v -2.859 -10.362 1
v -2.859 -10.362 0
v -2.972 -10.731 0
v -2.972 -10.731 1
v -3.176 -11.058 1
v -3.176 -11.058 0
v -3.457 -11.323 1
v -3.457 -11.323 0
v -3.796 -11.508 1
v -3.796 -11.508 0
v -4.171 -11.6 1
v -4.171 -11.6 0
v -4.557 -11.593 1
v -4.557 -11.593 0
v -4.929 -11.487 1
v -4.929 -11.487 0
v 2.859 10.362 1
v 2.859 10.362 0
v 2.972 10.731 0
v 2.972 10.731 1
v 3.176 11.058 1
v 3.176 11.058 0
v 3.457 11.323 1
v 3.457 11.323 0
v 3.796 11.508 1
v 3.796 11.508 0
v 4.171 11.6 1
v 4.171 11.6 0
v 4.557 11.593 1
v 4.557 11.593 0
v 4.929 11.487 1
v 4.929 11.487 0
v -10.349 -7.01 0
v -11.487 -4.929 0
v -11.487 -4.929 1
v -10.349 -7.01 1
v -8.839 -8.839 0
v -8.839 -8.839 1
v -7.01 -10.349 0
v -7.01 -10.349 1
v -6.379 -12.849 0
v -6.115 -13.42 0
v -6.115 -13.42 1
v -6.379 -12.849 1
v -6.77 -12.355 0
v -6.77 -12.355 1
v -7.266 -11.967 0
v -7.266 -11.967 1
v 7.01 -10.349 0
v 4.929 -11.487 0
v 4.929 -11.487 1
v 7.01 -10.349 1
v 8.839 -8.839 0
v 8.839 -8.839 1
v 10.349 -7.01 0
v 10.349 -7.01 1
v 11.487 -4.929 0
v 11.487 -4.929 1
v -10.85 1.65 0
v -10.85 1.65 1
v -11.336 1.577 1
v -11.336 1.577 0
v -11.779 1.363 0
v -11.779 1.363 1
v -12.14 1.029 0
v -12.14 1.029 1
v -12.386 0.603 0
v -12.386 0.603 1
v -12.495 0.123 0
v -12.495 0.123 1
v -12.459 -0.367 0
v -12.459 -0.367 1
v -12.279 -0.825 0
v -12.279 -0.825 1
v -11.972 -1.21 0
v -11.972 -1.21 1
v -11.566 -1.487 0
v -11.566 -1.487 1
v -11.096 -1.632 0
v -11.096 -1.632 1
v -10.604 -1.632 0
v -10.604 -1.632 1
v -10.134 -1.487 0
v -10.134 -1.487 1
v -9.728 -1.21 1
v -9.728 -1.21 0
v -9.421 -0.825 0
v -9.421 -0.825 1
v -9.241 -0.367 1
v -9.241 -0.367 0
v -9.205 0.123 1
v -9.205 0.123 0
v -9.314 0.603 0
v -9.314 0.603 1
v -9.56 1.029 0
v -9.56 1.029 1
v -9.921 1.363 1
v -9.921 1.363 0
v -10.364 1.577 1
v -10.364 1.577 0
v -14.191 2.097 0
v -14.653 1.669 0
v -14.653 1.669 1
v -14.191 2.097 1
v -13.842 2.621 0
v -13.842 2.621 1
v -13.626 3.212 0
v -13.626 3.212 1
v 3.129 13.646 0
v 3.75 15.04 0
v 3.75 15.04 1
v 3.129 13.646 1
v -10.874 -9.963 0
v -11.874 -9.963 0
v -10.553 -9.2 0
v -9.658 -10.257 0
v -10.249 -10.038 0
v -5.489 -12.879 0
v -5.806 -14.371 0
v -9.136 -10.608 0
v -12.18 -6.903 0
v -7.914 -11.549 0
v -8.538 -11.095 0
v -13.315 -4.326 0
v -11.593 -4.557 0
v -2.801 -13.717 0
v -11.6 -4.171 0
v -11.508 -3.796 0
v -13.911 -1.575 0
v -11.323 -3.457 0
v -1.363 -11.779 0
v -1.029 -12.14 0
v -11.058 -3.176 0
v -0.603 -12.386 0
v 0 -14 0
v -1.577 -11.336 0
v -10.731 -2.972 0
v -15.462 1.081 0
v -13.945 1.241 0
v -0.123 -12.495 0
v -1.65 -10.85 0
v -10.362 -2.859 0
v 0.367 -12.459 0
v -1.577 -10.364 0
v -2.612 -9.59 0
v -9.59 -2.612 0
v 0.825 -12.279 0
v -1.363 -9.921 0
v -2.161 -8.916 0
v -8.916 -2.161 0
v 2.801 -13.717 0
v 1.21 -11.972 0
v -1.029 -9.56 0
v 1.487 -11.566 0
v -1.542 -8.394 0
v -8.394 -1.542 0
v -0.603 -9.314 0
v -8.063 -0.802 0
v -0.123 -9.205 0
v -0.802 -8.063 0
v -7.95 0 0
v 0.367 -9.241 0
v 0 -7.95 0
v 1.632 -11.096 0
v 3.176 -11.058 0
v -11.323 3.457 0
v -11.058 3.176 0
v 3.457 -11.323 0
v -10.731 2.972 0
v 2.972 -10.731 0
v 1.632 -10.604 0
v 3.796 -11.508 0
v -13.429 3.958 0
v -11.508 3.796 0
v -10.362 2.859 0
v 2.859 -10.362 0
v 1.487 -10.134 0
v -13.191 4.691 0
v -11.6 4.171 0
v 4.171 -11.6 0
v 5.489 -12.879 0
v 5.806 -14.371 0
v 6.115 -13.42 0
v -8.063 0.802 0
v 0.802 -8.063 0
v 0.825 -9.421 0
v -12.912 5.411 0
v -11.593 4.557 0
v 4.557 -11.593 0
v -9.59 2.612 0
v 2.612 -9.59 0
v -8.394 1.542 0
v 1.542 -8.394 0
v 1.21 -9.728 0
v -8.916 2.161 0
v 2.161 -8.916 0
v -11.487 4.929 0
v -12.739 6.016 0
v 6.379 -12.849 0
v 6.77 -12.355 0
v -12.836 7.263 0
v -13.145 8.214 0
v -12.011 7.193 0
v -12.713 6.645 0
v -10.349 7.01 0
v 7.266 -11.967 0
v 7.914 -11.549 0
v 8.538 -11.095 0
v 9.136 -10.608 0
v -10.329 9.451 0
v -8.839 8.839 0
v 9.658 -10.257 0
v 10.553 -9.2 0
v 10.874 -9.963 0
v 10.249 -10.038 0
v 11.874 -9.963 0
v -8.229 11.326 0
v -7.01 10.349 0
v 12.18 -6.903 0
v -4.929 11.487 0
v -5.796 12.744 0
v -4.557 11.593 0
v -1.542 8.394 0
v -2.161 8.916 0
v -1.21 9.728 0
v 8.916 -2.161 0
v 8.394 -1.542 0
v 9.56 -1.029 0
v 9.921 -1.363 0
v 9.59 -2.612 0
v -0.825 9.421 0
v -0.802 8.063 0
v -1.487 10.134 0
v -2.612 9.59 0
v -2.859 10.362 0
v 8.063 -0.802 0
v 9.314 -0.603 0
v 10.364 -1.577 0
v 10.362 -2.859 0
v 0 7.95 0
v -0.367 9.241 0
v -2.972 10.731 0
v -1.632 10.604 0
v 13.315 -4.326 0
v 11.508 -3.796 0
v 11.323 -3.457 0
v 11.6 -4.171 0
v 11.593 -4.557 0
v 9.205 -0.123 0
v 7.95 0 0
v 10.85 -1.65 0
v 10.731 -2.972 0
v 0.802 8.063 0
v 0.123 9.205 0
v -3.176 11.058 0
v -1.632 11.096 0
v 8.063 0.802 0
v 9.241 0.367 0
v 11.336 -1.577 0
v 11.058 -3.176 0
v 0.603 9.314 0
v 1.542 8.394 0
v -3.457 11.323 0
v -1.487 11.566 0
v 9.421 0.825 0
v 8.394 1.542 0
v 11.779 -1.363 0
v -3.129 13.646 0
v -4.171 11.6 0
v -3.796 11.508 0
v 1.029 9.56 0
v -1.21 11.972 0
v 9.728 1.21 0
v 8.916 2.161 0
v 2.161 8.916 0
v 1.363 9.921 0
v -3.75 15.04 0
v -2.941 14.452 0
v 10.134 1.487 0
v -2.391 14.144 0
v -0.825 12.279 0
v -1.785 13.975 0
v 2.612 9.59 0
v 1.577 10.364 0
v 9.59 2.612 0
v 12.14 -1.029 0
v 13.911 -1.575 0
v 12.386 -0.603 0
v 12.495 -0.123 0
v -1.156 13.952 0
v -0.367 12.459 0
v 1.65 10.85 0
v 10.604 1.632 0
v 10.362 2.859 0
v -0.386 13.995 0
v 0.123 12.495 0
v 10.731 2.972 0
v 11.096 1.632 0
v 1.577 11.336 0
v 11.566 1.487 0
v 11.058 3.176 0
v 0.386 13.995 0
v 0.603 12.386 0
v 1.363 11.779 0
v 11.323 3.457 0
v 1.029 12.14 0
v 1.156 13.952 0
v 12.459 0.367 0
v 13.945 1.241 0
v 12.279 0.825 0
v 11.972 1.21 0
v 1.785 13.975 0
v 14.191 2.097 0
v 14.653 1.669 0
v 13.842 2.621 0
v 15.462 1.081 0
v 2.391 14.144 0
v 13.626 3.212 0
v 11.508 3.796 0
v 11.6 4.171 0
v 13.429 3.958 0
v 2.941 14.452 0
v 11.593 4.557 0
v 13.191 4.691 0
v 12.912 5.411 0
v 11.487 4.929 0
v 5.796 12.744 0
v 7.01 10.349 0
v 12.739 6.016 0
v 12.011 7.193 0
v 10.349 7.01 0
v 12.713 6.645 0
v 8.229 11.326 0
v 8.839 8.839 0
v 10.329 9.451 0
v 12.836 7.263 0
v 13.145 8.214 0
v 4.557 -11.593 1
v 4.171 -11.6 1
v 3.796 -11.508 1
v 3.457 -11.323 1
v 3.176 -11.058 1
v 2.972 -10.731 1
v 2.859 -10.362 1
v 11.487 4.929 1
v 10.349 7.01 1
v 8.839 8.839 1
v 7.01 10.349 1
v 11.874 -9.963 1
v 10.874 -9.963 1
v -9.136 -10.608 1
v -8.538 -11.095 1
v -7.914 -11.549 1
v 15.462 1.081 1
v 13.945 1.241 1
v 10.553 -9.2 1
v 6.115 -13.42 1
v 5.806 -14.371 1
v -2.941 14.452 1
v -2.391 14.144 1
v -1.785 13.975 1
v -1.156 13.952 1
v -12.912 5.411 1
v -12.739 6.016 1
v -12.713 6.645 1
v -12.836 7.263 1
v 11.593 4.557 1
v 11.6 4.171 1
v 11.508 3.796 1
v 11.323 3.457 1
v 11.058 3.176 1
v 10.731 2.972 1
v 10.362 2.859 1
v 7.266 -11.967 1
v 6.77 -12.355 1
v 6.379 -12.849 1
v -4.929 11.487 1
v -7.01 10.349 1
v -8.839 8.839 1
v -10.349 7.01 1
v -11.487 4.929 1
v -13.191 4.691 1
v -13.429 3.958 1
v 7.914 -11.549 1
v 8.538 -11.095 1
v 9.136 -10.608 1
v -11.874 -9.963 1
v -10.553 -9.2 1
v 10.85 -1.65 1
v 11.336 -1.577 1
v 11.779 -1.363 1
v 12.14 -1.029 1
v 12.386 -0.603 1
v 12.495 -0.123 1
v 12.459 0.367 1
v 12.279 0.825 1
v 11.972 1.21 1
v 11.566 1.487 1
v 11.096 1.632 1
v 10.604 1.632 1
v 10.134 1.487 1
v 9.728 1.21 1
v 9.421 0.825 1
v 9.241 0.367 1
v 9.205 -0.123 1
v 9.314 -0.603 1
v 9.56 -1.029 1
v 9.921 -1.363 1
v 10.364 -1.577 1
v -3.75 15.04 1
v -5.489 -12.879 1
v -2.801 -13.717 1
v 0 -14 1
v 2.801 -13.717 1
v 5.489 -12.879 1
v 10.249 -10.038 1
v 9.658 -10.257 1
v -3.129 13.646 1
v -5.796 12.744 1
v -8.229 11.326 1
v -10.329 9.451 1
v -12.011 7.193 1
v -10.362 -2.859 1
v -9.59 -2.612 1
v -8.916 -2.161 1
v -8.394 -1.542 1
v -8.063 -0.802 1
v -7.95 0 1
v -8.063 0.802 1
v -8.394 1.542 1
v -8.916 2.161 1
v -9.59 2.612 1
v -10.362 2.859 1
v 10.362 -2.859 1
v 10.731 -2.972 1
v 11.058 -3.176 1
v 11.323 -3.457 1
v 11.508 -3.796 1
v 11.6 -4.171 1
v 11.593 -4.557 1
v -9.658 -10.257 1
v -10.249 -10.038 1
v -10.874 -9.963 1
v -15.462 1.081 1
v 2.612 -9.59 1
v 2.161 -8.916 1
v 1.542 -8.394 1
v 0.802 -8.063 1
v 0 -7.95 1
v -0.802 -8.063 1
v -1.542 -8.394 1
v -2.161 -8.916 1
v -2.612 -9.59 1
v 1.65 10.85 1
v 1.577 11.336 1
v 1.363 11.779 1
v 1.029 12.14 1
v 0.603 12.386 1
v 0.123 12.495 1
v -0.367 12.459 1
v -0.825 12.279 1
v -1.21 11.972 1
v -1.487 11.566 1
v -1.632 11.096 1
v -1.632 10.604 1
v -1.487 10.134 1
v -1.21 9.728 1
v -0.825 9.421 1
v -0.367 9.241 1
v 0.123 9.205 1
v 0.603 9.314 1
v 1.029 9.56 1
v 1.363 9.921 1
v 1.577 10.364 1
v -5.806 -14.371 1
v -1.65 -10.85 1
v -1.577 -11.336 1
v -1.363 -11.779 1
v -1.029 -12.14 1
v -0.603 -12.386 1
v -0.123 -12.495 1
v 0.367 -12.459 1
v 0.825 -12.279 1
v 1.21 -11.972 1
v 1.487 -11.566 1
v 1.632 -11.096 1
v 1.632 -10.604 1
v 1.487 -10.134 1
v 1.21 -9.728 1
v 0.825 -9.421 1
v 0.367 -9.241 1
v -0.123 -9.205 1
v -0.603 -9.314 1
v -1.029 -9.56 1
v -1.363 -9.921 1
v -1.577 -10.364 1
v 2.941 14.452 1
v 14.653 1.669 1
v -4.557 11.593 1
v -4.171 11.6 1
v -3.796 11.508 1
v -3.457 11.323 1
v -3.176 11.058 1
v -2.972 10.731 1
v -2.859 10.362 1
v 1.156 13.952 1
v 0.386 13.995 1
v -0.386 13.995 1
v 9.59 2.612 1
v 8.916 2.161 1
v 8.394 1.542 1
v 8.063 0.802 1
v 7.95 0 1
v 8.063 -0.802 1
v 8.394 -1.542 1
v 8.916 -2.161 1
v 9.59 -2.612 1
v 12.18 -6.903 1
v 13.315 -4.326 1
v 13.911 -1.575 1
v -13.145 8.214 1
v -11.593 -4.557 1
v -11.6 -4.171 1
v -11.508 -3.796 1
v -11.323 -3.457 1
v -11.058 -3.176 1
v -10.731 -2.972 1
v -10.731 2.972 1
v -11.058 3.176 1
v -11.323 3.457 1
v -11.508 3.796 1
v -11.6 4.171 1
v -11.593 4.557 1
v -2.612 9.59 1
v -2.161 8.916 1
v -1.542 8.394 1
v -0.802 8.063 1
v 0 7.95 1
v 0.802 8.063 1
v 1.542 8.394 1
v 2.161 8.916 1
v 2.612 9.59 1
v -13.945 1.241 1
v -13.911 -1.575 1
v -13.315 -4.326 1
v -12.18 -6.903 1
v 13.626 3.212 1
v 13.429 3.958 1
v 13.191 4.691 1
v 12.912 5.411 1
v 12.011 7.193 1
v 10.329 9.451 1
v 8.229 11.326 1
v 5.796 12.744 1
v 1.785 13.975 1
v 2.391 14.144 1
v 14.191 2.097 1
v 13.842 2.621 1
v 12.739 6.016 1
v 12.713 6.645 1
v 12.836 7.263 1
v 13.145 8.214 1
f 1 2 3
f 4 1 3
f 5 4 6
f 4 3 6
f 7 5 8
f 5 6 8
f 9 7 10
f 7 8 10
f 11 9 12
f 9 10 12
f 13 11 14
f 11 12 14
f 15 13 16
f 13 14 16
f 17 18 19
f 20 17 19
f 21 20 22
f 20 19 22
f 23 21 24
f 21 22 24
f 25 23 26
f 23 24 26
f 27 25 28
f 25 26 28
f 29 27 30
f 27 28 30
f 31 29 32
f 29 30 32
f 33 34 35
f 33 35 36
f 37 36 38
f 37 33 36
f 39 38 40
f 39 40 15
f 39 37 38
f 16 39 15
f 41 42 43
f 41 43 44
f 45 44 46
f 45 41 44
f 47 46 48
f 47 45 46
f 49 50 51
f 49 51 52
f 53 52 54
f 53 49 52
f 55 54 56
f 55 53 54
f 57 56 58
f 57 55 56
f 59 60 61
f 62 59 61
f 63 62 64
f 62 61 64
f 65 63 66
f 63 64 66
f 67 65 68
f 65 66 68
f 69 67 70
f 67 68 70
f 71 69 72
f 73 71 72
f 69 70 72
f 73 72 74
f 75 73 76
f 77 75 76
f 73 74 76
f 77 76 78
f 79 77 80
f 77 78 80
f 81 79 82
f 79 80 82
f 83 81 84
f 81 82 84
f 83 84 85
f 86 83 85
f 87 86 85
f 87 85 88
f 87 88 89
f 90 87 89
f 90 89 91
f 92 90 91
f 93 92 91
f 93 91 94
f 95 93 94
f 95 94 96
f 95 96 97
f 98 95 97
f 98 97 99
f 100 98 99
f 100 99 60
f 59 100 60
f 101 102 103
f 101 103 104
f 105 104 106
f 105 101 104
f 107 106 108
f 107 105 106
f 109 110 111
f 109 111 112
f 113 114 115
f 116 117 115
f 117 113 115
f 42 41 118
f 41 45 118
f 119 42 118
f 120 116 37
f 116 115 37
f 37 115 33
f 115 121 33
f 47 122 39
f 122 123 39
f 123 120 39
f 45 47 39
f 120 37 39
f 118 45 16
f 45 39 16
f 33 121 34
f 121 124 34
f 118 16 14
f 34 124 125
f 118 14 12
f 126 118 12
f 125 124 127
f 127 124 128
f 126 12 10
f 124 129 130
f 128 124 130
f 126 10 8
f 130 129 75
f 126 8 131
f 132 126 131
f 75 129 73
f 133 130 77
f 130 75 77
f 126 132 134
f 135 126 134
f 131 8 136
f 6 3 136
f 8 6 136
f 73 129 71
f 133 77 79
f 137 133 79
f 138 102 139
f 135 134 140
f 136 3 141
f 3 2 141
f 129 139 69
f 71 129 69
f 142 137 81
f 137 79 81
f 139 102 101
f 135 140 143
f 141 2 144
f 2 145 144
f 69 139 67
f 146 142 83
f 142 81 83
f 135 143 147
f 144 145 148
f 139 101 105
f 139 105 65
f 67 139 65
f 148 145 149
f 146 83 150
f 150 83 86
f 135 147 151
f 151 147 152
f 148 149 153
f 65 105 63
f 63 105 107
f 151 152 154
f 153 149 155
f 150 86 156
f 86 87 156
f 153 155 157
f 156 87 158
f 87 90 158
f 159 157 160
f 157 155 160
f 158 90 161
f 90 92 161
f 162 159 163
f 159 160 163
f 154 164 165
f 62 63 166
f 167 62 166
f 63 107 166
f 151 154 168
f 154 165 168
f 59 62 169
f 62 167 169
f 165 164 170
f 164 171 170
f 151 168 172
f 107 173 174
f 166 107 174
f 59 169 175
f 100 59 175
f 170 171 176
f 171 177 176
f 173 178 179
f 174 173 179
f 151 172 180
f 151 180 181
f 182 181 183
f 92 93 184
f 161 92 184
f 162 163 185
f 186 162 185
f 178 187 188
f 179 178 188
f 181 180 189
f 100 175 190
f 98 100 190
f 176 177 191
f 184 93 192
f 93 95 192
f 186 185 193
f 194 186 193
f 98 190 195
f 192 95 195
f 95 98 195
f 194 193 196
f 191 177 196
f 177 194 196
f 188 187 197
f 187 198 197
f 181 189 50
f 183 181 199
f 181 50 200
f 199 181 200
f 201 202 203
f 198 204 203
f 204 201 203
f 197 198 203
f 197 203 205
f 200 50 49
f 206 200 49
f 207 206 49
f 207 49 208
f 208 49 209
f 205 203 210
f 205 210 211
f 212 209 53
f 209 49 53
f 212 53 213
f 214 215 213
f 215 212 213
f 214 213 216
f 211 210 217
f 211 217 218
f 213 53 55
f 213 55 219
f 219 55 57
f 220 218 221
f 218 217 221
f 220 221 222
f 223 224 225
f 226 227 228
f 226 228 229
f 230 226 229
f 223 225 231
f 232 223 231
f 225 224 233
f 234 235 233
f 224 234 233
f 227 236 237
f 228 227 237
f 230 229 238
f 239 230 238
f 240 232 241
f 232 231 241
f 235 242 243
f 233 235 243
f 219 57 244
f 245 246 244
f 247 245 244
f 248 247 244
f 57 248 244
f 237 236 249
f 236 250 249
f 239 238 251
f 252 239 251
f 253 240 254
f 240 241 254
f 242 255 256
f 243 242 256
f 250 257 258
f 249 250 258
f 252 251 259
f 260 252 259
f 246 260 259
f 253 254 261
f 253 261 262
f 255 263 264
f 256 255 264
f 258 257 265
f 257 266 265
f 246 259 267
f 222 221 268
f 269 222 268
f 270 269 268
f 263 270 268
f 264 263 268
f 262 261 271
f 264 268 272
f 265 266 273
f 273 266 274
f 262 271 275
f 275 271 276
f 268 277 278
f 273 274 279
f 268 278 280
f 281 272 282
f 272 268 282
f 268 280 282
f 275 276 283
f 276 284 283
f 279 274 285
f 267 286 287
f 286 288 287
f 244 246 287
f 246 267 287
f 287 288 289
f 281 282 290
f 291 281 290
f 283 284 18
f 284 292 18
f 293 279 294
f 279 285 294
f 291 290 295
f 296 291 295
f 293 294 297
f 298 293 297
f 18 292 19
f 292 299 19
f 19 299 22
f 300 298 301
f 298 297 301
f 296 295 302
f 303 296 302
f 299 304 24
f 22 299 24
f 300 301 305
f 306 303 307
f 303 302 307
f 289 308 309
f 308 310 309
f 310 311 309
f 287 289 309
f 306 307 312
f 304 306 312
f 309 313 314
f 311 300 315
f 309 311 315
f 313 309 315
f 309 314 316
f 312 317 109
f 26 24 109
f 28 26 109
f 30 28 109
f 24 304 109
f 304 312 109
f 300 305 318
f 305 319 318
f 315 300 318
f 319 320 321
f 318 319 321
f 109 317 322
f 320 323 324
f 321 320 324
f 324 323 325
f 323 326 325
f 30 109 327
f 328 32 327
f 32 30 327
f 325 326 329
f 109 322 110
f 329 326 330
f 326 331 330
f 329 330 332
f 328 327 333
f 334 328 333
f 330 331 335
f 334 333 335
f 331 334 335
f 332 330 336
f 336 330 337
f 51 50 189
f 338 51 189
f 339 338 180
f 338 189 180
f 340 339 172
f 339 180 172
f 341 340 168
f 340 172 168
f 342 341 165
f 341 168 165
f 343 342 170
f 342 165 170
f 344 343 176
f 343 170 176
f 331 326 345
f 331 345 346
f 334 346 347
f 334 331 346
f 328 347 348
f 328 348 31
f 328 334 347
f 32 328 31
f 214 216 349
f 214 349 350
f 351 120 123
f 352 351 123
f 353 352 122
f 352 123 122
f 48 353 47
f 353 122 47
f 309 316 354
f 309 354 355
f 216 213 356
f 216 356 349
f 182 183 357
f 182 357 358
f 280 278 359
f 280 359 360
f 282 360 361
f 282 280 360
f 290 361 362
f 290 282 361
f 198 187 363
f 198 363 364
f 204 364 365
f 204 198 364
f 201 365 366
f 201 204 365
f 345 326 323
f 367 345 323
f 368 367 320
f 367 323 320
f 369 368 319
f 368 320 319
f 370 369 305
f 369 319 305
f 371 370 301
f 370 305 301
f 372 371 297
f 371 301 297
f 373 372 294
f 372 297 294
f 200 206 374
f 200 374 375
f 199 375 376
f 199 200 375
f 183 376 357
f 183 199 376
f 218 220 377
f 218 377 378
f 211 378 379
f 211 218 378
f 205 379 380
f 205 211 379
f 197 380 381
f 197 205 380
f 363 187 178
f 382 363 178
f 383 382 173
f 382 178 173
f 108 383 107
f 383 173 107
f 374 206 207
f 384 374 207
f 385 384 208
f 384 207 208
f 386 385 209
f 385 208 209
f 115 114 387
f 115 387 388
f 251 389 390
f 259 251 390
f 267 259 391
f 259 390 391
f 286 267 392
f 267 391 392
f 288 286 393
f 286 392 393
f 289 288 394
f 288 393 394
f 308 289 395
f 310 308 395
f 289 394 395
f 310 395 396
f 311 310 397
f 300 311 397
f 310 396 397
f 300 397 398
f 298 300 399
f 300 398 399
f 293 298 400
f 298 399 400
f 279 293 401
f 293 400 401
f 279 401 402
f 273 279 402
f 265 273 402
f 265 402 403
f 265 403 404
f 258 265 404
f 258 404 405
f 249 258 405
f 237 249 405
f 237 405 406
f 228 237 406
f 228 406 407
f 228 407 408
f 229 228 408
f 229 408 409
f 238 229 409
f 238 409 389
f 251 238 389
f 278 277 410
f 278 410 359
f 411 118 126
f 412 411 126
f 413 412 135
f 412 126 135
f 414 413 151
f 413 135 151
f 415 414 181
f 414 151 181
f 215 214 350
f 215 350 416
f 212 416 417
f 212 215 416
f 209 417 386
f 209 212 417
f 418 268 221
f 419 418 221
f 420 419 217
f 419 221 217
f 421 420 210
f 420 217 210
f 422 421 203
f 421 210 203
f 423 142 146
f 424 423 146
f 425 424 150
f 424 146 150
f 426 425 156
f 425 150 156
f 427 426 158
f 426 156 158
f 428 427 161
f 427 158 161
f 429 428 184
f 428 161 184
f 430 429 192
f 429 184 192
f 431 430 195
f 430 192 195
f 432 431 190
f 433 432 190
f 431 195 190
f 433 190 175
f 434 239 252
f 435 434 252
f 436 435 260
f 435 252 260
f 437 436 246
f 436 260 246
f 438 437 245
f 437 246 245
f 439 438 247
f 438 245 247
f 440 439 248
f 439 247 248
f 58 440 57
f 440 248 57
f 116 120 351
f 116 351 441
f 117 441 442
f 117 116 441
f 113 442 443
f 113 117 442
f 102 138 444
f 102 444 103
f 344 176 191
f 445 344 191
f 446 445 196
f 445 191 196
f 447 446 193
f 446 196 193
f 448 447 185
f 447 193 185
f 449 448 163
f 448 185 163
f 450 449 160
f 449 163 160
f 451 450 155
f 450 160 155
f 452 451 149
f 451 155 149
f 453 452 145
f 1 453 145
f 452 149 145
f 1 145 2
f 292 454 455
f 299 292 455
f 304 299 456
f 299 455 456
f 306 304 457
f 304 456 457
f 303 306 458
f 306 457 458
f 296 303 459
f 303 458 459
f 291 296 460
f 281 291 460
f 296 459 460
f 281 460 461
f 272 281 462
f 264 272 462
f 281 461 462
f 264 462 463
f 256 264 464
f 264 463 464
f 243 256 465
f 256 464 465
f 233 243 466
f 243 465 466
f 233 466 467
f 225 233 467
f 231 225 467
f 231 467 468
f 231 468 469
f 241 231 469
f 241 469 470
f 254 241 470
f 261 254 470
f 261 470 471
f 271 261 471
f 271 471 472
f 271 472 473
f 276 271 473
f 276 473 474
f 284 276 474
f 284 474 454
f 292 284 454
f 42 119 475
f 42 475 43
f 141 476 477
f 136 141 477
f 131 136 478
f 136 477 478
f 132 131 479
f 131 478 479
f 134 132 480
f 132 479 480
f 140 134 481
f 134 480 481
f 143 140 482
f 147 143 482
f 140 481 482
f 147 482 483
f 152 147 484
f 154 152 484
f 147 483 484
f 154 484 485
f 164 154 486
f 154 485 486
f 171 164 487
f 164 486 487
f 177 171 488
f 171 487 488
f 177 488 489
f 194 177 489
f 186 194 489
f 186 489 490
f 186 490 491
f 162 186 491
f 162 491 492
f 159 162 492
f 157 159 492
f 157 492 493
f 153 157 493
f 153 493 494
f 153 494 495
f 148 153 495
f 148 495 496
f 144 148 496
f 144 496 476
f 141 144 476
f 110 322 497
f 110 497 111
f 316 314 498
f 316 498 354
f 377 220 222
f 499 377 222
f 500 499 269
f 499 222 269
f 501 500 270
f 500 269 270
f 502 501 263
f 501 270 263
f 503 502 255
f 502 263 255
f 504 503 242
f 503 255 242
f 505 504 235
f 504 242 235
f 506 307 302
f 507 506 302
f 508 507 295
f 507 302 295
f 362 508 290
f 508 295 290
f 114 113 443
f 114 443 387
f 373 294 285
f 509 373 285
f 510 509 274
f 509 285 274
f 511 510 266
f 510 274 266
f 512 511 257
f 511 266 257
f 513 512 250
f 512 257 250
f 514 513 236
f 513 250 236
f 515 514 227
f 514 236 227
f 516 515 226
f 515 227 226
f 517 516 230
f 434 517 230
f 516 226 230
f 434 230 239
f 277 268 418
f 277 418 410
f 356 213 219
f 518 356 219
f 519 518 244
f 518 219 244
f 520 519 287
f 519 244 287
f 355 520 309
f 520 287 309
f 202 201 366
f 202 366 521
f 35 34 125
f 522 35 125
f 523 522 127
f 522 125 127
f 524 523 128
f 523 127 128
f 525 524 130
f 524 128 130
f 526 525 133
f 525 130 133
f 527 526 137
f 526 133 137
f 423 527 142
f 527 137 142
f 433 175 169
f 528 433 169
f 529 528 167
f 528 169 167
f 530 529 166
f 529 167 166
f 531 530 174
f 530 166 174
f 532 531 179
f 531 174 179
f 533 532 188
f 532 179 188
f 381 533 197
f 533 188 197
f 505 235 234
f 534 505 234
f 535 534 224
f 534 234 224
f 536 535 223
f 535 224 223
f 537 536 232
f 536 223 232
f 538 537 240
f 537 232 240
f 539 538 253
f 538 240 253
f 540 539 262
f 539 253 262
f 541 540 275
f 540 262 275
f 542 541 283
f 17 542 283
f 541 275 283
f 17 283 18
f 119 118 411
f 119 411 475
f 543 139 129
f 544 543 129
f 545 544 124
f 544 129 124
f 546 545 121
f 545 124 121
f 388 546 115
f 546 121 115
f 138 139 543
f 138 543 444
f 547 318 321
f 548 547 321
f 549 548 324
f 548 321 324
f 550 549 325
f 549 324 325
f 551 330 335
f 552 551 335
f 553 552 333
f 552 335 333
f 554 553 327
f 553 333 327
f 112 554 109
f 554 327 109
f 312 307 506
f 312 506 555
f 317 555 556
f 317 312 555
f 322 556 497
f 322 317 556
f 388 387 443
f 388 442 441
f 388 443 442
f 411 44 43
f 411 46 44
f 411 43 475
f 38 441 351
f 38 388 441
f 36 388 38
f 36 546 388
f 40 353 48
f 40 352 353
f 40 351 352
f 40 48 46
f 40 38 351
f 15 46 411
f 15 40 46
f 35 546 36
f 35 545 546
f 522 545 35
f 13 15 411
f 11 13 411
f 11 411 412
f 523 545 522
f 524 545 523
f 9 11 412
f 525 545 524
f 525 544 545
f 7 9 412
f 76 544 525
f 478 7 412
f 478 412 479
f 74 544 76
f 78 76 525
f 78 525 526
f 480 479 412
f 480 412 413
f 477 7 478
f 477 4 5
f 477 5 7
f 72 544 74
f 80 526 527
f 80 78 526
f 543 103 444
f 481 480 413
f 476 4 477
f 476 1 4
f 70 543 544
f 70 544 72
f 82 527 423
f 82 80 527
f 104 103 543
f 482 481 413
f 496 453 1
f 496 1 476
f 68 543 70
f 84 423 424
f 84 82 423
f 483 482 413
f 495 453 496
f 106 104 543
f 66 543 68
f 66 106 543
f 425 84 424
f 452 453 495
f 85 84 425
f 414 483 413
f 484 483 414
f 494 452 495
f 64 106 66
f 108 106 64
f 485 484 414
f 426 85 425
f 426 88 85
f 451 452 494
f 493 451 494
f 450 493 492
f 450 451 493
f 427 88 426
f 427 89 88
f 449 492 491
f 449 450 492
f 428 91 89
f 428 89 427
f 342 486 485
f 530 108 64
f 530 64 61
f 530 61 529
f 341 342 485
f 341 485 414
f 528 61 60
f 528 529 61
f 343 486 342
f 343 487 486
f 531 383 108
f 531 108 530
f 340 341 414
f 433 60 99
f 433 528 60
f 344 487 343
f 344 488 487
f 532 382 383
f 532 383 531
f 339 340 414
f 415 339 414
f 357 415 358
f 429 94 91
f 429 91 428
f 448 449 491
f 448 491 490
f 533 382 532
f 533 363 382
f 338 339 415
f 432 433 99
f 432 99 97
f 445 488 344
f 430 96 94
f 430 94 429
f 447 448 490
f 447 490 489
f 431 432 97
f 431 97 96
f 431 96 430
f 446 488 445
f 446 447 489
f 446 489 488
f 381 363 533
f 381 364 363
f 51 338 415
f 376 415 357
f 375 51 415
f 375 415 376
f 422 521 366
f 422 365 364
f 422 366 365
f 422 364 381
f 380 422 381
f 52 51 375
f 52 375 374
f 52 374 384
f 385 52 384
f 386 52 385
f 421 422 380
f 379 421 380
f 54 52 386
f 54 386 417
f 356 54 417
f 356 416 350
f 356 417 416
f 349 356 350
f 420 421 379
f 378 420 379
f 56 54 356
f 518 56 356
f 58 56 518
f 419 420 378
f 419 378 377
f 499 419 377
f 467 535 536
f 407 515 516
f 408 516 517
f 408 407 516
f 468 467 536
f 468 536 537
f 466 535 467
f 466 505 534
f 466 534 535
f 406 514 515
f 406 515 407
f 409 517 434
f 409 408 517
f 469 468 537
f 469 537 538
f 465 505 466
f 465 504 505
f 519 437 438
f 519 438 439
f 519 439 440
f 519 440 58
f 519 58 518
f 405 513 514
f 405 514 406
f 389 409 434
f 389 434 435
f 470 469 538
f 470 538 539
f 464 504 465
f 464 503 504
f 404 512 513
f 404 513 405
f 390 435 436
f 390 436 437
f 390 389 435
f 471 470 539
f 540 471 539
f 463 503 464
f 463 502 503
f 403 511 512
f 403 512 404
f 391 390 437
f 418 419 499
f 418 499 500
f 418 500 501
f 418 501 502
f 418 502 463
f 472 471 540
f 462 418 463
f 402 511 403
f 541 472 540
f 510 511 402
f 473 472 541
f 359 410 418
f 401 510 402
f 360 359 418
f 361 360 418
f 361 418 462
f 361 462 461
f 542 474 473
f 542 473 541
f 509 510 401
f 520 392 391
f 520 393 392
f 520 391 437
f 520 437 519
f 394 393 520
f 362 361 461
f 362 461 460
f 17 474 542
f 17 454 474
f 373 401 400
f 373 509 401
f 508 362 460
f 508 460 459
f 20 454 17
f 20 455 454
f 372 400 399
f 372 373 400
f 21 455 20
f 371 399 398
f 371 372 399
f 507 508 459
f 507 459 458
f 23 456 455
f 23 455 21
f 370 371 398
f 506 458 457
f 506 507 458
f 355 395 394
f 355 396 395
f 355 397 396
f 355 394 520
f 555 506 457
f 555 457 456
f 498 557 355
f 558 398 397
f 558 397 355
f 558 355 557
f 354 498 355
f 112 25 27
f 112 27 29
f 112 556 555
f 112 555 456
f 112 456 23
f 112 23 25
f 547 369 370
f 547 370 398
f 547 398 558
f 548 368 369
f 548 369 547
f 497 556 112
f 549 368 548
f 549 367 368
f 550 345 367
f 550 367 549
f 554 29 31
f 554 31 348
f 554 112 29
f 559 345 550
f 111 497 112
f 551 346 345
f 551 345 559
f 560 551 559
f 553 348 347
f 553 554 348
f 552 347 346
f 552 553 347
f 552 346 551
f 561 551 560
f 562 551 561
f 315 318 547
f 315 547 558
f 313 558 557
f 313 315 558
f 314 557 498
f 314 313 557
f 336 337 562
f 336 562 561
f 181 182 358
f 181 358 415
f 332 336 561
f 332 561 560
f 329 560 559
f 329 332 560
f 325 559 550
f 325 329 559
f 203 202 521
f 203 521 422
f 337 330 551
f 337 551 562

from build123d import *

# Parameters (mm, degrees)
SKETCH5_R                  = 14
SKETCH5_R_2                = 12.5
RING_DEPTH                 = 1
TEETH_DEPTH                = 1
SCREW_BUMPS_DEPTH          = 1
SCREW_CLEARENCE_HOLE_REACH = 22.572
SKETCH8_R                  = 1.65
CIR_PAT_FOR_SCREWS_COUNT   = 4
CIR_PAT_TEETH_COUNT        = 5


with BuildPart() as part:
    # Sketch5 → ring (new body)
    with BuildSketch(Plane.XY):
        Circle(SKETCH5_R)
        Circle(SKETCH5_R_2, mode=Mode.SUBTRACT)
    extrude(amount=RING_DEPTH)

    # Sketch6 → teeth (add)
    with BuildSketch(Plane.XY):
        with BuildLine():
            Line((-3.75, 15.039531243), (-2.940974774, 14.45175732))
            ThreePointArc((-2.940974774, 14.45175732), (-2.093195964, 14.041639747), (-1.155683759, 13.952218284))
            ThreePointArc((-1.155683759, 13.952218284), (-2.148028374, 13.834231967), (-3.129428252, 13.645756806))
            Line((-3.129428252, 13.645756806), (-3.75, 15.039531243))
        make_face()
        with BuildLine():
            Line((3.75, 15.039531243), (3.129428252, 13.645756806))
            ThreePointArc((3.129428252, 13.645756806), (2.148028374, 13.834231967), (1.155683759, 13.952218284))
            ThreePointArc((1.155683759, 13.952218284), (2.093195964, 14.041639747), (2.940974774, 14.45175732))
            Line((2.940974774, 14.45175732), (3.75, 15.039531243))
        make_face()
    teeth = extrude(amount=TEETH_DEPTH)

    # Sketch7 → screw bumps (add)
    with BuildSketch(Plane.XY):
        with BuildLine():
            Line((4.928560895, 11.487353372), (4.928560895, 13.103789051))
            Line((4.928560895, 13.103789051), (-4.928560895, 13.103789051))
            Line((-4.928560895, 13.103789051), (-4.928560895, 11.487353372))
            ThreePointArc((-4.928560895, 11.487353372), (-3.62045714, 11.426586745), (-2.858565319, 10.361528592))
            ThreePointArc((-2.858565319, 10.361528592), (0, 7.95), (2.858565319, 10.361528592))
            ThreePointArc((2.858565319, 10.361528592), (3.62045714, 11.426586745), (4.928560895, 11.487353372))
        make_face()
    screw_bumps = extrude(amount=SCREW_BUMPS_DEPTH)

    # Sketch8 → screw clearence hole (cut, up to next)
    with BuildSketch(Plane.XY.offset(1), mode=Mode.PRIVATE) as screw_clearence_hole_sk1:
        with Locations((0, 10.85)):
            Circle(SKETCH8_R)
    screw_clearence_hole_tool1 = extrude(screw_clearence_hole_sk1.sketch, amount=-SCREW_CLEARENCE_HOLE_REACH, mode=Mode.PRIVATE) & part.part
    screw_clearence_hole = screw_clearence_hole_tool1.solids().sort_by_distance((0, 10.85, 1))[0]
    add(screw_clearence_hole, mode=Mode.SUBTRACT)

    # cir pat for screws: screw bumps, screw clearence hole ×4 about axis
    cir_pat_for_screws_axis = Axis((0, 0, 0), (0, 0, 1))
    add([screw_bumps.rotate(cir_pat_for_screws_axis, i * 360 / CIR_PAT_FOR_SCREWS_COUNT) for i in range(1, CIR_PAT_FOR_SCREWS_COUNT)])
    add([screw_clearence_hole.rotate(cir_pat_for_screws_axis, i * 360 / CIR_PAT_FOR_SCREWS_COUNT) for i in range(1, CIR_PAT_FOR_SCREWS_COUNT)], mode=Mode.SUBTRACT)

    # cir.pat. teeth: teeth ×5 about axis
    cir_pat_teeth_axis = Axis((0, 0, 0), (0, 0, 1))
    for i in range(1, CIR_PAT_TEETH_COUNT):
        add(teeth.rotate(cir_pat_teeth_axis, i * 360 / CIR_PAT_TEETH_COUNT))


solid = part.part
